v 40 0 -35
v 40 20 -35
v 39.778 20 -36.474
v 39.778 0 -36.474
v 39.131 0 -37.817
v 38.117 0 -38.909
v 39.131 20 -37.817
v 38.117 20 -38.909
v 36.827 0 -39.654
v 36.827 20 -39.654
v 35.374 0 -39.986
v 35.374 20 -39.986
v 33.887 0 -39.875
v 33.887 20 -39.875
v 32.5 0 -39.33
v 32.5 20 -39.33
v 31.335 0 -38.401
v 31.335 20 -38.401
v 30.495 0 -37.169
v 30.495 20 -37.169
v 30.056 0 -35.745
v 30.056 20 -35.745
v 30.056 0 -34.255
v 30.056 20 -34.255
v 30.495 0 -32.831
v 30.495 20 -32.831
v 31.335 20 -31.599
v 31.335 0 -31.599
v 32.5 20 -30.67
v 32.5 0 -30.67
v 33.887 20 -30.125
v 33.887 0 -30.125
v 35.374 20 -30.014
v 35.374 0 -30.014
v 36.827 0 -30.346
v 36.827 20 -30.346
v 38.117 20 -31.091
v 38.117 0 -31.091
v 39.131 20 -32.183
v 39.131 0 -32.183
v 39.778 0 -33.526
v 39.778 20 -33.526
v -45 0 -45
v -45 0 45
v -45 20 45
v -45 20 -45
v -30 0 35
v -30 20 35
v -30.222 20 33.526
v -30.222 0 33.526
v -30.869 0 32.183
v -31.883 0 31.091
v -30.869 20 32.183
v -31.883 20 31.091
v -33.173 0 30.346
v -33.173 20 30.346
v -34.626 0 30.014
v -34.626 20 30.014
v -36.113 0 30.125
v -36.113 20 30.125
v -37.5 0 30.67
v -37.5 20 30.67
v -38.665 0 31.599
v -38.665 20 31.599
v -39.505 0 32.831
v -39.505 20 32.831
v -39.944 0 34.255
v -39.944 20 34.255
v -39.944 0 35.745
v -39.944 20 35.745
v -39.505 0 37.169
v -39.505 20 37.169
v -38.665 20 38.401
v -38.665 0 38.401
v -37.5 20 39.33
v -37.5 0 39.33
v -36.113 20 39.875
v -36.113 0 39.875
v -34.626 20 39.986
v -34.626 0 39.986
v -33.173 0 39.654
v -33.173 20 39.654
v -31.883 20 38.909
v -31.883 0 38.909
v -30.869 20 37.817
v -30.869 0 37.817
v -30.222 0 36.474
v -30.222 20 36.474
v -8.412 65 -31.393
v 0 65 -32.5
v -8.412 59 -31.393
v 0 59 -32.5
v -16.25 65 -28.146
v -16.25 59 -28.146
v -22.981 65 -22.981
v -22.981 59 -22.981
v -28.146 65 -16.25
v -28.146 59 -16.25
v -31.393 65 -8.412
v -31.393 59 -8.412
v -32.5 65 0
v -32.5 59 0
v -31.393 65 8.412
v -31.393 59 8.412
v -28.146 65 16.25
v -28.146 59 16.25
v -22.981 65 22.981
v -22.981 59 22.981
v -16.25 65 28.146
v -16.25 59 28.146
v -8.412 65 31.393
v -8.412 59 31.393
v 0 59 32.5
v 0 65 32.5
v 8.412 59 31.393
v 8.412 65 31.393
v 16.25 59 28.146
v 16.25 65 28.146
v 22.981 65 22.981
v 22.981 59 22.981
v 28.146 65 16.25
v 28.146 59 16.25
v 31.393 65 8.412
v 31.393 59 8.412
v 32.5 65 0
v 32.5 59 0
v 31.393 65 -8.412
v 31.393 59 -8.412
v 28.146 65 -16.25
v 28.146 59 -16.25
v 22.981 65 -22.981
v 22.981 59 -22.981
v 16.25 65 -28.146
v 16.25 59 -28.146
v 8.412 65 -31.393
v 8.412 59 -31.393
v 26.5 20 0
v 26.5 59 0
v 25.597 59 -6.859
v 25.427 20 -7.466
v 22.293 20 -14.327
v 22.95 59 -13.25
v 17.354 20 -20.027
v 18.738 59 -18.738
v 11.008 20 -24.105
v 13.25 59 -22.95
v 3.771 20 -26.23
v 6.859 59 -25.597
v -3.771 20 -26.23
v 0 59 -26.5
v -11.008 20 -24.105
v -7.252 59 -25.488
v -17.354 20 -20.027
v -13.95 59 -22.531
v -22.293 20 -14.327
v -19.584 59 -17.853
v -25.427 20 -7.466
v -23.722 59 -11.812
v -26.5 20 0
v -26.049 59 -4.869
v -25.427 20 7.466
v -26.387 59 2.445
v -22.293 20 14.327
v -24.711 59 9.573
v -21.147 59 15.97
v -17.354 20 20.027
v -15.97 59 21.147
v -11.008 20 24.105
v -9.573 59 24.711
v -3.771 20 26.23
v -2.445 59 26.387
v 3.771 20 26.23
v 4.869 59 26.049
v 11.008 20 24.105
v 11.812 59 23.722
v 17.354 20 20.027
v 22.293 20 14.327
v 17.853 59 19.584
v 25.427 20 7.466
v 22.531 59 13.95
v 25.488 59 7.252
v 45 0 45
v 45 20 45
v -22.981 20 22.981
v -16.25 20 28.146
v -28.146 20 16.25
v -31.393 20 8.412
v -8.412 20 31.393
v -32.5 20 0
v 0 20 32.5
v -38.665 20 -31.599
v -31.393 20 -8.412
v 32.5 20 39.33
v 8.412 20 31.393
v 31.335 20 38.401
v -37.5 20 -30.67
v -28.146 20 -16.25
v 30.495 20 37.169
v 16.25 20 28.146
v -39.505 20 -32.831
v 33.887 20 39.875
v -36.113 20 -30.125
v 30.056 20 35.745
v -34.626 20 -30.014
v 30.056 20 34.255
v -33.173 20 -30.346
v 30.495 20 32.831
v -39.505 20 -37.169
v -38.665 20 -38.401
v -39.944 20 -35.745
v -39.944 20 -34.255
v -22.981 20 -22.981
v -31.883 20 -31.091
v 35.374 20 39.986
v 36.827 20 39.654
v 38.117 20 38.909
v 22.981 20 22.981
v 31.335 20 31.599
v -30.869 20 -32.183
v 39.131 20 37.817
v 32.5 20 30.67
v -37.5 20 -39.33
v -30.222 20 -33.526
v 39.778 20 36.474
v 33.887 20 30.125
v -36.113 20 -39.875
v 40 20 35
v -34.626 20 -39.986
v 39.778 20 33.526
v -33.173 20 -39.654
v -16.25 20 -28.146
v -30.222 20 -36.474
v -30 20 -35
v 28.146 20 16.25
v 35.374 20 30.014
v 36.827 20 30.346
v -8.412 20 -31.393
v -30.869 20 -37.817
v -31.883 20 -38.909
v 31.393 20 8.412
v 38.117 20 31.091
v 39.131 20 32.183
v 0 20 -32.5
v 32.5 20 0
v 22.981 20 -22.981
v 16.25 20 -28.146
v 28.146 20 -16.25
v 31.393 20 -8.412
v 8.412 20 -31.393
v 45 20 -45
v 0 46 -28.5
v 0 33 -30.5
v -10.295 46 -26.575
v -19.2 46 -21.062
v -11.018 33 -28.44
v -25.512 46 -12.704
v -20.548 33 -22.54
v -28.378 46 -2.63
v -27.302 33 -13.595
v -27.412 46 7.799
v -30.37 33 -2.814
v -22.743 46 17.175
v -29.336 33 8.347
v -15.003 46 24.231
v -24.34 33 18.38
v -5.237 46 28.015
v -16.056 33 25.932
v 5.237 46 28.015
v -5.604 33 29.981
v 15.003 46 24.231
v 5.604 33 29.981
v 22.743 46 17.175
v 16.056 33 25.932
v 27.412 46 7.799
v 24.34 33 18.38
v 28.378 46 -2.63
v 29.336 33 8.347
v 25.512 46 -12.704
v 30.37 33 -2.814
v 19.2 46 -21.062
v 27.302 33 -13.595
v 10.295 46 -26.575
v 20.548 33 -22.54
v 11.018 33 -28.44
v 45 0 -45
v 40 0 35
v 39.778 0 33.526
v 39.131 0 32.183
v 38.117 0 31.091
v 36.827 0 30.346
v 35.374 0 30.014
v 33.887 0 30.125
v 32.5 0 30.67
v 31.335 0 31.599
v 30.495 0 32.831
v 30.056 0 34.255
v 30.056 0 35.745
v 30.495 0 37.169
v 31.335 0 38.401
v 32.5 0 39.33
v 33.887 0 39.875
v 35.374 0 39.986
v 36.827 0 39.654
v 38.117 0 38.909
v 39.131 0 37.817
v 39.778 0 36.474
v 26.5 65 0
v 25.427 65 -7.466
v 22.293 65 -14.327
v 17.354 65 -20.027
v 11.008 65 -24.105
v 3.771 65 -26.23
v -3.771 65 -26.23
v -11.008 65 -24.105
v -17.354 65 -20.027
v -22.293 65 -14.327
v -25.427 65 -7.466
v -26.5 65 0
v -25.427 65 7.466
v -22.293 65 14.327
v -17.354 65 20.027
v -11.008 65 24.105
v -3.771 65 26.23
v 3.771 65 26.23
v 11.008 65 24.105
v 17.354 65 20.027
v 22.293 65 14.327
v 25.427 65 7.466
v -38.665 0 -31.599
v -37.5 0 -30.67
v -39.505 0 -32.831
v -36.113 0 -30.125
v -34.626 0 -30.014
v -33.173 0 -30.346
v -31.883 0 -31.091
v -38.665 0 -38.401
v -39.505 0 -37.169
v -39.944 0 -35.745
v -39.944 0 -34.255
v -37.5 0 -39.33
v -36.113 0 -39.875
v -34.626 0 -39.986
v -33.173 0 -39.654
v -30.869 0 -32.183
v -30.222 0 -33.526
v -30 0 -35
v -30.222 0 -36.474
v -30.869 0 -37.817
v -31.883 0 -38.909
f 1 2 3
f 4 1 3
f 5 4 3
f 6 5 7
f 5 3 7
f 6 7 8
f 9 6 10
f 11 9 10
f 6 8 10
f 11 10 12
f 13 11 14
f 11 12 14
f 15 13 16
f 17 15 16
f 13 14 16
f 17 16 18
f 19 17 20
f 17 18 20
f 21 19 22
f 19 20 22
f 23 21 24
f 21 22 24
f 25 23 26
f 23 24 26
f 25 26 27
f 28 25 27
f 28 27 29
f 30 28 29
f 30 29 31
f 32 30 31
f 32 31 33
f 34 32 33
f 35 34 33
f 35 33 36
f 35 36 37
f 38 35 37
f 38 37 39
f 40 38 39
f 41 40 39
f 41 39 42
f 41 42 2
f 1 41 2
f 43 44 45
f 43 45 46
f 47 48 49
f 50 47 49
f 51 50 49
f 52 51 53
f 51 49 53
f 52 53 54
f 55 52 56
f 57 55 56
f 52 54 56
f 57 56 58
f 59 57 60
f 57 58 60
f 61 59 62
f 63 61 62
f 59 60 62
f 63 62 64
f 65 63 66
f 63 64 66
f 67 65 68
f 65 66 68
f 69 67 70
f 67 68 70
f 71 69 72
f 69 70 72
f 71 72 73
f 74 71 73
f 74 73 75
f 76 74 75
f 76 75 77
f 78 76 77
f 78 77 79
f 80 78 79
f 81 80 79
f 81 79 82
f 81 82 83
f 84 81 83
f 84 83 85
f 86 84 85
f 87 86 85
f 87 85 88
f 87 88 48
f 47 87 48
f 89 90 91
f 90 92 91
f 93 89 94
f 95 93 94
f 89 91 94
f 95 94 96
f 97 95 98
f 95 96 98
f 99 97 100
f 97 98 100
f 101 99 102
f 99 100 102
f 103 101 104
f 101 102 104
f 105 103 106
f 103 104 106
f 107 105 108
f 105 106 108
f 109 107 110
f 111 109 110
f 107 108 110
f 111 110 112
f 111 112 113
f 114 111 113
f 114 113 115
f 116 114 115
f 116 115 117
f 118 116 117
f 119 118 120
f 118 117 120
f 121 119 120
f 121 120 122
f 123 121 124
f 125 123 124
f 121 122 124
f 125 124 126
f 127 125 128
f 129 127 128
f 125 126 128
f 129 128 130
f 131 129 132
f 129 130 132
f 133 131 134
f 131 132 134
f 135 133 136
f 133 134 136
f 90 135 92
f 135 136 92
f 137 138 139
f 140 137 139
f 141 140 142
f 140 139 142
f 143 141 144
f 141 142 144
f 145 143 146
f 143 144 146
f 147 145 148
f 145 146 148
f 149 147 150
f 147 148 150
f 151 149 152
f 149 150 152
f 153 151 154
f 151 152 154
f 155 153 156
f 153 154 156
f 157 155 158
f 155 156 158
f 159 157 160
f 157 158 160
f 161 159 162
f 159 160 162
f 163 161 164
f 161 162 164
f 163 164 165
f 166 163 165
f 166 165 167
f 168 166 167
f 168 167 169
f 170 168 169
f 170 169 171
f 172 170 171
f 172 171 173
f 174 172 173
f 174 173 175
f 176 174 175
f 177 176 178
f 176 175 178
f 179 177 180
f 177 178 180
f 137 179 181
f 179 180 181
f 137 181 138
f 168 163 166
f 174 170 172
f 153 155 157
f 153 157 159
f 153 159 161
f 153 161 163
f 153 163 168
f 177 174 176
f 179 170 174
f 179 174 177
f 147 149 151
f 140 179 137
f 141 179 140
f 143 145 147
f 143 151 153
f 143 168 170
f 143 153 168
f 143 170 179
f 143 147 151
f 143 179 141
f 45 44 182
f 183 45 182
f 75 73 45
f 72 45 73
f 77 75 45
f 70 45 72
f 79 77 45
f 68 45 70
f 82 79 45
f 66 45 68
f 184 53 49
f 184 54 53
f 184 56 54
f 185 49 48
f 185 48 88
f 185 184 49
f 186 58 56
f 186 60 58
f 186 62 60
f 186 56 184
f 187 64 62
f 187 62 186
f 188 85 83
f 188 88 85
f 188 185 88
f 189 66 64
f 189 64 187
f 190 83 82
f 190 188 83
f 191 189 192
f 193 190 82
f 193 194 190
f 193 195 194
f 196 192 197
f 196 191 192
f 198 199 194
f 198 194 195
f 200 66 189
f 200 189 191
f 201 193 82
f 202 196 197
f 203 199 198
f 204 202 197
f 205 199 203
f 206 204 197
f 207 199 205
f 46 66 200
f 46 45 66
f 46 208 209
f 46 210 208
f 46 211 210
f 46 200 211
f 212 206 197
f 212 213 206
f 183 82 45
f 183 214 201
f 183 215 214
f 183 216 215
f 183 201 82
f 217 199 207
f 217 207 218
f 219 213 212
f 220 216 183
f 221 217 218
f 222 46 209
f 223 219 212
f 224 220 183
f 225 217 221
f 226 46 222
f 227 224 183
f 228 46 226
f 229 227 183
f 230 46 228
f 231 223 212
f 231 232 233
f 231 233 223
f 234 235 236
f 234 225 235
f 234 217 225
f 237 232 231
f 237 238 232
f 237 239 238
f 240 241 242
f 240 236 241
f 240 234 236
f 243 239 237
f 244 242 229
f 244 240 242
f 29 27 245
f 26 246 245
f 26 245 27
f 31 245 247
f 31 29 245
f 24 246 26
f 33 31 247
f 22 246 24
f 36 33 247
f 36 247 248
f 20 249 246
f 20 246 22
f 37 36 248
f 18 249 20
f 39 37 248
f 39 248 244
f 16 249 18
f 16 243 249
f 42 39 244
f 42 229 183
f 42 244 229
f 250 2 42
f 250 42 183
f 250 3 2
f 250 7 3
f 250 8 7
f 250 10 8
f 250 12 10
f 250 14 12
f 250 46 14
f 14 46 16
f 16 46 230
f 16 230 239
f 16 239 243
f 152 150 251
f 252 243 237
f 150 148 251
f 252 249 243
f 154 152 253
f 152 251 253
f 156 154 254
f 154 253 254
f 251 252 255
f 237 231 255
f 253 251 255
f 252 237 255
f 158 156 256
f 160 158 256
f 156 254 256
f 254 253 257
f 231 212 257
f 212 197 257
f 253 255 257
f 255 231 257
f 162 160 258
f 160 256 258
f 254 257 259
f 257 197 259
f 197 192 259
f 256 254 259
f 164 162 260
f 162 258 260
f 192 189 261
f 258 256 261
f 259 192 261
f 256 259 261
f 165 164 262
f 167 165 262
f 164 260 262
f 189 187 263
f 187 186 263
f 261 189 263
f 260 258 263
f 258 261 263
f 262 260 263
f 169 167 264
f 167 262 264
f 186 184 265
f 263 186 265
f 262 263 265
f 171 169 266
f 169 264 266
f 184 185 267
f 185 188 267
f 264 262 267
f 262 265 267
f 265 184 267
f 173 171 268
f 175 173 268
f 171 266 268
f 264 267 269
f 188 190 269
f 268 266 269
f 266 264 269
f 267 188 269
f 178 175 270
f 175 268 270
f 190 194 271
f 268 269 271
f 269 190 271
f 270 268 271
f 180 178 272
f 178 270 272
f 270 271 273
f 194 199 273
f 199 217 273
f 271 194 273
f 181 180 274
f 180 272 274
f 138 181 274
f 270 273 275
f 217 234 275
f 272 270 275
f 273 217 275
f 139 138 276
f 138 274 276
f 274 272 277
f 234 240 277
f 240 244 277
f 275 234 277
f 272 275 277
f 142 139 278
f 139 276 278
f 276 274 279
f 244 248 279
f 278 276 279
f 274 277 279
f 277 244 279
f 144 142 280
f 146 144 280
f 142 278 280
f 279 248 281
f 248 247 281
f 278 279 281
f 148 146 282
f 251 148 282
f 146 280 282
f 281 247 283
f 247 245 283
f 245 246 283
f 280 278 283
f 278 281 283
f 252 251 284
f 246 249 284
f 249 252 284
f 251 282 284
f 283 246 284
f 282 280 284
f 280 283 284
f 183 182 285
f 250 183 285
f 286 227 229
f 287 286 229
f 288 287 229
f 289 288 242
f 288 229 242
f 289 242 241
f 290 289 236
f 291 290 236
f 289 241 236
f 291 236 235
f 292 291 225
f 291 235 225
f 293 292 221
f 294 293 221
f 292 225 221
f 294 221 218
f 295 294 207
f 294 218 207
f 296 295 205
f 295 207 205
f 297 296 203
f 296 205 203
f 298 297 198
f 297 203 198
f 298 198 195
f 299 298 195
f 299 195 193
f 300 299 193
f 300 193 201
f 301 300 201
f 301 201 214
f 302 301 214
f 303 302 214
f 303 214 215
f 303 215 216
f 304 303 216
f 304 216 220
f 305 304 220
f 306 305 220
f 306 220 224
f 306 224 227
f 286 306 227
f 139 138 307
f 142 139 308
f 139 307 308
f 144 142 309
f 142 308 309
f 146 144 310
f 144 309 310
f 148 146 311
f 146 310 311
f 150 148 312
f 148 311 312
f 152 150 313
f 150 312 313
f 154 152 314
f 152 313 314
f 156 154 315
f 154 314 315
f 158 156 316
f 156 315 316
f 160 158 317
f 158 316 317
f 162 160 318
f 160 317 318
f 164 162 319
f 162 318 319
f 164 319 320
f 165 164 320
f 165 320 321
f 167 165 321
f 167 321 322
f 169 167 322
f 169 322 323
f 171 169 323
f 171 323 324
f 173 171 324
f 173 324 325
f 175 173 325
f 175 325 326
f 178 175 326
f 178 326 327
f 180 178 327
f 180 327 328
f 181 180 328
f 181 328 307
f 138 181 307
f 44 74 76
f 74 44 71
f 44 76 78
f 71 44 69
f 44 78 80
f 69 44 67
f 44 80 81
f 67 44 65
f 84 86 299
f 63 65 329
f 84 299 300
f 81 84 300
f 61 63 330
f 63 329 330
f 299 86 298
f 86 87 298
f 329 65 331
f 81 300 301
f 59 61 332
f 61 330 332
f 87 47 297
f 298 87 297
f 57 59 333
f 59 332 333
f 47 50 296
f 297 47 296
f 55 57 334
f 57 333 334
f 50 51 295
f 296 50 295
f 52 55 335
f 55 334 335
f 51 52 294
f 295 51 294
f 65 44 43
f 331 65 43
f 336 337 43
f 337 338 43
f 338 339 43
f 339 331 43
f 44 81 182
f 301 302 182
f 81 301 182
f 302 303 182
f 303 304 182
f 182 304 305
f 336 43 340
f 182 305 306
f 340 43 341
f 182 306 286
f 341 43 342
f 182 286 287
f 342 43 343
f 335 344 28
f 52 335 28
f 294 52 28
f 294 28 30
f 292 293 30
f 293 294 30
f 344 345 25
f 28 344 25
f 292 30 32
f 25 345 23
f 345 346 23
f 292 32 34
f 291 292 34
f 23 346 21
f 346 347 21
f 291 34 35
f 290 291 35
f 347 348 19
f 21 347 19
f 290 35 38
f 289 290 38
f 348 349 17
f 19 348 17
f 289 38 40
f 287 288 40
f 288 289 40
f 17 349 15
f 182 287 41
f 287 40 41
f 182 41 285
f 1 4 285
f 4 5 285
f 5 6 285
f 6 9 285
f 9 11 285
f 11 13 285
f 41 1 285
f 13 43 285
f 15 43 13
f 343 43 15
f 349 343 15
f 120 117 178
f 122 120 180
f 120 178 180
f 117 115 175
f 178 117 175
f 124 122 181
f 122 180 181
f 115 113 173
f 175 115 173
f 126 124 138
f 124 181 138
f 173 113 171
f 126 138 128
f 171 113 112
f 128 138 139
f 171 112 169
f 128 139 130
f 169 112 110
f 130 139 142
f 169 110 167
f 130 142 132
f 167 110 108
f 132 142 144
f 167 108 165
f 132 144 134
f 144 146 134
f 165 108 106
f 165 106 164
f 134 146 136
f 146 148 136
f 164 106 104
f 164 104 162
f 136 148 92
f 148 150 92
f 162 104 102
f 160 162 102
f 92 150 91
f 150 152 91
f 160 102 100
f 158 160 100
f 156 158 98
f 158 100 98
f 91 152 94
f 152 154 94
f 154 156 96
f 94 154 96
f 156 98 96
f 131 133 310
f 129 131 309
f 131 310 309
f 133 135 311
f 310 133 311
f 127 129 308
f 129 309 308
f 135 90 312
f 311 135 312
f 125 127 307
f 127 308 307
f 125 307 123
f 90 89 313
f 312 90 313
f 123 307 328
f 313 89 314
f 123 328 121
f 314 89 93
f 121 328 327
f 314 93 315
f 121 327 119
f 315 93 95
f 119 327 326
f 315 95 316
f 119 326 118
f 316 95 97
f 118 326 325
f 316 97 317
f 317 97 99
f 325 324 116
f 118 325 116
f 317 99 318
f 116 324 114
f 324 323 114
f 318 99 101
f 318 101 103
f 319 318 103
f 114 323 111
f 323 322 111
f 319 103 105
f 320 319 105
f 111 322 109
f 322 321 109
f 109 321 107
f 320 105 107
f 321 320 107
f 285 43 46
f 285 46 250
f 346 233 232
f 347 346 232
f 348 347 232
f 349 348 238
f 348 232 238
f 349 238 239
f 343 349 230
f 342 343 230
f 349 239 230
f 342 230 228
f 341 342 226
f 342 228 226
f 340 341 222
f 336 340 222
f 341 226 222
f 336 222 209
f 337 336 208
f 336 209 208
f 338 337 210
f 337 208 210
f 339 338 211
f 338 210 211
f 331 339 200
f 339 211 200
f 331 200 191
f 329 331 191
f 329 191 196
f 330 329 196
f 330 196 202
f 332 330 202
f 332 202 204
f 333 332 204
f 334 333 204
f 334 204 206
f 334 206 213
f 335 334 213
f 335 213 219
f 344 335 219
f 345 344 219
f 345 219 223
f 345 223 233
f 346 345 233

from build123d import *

# Parameters (mm, degrees)
SKETCH1_W           = 90
SKETCH1_H           = 90
BOSS_EXTRUDE1_DEPTH = 20
SKETCH3_R           = 26.5
CUT_EXTRUDE1_DEPTH  = 45
SKETCH4_R           = 5
CUT_EXTRUDE2_DEPTH  = 21


with BuildPart() as part:
    # Sketch1 → Boss-Extrude1 (new body)
    with BuildSketch(Plane(origin=(0, 0, 0), x_dir=(1, 0, 0), z_dir=(0, 1, 0))):
        Rectangle(SKETCH1_W, SKETCH1_H)
    extrude(amount=BOSS_EXTRUDE1_DEPTH)

    # Sketch2 → Revolve1 (revolve)
    with BuildSketch(Plane(origin=(0, 0, 0), x_dir=(0, 0, -1), z_dir=(1, 0, 0))):
        Polygon((0, 20), (0, 65), (32.5, 65), (32.5, 59), (26.5, 59), (32.5, 20), align=None)
    revolve(axis=Axis((0, 20, 0), (0, 1, 0)))

    # Sketch3 → Cut-Extrude1 (cut)
    with BuildSketch(Plane(origin=(0, 65, 0), x_dir=(1, 0, 0), z_dir=(0, 1, 0))):
        Circle(SKETCH3_R)
    extrude(amount=-CUT_EXTRUDE1_DEPTH, mode=Mode.SUBTRACT)

    # Sketch4 → Cut-Extrude2 (cut, through all)
    with BuildSketch(Plane(origin=(0, 20, 0), x_dir=(1, 0, 0), z_dir=(0, 1, 0))):
        with Locations((-35, -35)):
            Circle(SKETCH4_R)
        with Locations((35, -35)):
            Circle(SKETCH4_R)
        with Locations((35, 35)):
            Circle(SKETCH4_R)
        with Locations((-35, 35)):
            Circle(SKETCH4_R)
    extrude(amount=-CUT_EXTRUDE2_DEPTH, mode=Mode.SUBTRACT)


solid = part.part
